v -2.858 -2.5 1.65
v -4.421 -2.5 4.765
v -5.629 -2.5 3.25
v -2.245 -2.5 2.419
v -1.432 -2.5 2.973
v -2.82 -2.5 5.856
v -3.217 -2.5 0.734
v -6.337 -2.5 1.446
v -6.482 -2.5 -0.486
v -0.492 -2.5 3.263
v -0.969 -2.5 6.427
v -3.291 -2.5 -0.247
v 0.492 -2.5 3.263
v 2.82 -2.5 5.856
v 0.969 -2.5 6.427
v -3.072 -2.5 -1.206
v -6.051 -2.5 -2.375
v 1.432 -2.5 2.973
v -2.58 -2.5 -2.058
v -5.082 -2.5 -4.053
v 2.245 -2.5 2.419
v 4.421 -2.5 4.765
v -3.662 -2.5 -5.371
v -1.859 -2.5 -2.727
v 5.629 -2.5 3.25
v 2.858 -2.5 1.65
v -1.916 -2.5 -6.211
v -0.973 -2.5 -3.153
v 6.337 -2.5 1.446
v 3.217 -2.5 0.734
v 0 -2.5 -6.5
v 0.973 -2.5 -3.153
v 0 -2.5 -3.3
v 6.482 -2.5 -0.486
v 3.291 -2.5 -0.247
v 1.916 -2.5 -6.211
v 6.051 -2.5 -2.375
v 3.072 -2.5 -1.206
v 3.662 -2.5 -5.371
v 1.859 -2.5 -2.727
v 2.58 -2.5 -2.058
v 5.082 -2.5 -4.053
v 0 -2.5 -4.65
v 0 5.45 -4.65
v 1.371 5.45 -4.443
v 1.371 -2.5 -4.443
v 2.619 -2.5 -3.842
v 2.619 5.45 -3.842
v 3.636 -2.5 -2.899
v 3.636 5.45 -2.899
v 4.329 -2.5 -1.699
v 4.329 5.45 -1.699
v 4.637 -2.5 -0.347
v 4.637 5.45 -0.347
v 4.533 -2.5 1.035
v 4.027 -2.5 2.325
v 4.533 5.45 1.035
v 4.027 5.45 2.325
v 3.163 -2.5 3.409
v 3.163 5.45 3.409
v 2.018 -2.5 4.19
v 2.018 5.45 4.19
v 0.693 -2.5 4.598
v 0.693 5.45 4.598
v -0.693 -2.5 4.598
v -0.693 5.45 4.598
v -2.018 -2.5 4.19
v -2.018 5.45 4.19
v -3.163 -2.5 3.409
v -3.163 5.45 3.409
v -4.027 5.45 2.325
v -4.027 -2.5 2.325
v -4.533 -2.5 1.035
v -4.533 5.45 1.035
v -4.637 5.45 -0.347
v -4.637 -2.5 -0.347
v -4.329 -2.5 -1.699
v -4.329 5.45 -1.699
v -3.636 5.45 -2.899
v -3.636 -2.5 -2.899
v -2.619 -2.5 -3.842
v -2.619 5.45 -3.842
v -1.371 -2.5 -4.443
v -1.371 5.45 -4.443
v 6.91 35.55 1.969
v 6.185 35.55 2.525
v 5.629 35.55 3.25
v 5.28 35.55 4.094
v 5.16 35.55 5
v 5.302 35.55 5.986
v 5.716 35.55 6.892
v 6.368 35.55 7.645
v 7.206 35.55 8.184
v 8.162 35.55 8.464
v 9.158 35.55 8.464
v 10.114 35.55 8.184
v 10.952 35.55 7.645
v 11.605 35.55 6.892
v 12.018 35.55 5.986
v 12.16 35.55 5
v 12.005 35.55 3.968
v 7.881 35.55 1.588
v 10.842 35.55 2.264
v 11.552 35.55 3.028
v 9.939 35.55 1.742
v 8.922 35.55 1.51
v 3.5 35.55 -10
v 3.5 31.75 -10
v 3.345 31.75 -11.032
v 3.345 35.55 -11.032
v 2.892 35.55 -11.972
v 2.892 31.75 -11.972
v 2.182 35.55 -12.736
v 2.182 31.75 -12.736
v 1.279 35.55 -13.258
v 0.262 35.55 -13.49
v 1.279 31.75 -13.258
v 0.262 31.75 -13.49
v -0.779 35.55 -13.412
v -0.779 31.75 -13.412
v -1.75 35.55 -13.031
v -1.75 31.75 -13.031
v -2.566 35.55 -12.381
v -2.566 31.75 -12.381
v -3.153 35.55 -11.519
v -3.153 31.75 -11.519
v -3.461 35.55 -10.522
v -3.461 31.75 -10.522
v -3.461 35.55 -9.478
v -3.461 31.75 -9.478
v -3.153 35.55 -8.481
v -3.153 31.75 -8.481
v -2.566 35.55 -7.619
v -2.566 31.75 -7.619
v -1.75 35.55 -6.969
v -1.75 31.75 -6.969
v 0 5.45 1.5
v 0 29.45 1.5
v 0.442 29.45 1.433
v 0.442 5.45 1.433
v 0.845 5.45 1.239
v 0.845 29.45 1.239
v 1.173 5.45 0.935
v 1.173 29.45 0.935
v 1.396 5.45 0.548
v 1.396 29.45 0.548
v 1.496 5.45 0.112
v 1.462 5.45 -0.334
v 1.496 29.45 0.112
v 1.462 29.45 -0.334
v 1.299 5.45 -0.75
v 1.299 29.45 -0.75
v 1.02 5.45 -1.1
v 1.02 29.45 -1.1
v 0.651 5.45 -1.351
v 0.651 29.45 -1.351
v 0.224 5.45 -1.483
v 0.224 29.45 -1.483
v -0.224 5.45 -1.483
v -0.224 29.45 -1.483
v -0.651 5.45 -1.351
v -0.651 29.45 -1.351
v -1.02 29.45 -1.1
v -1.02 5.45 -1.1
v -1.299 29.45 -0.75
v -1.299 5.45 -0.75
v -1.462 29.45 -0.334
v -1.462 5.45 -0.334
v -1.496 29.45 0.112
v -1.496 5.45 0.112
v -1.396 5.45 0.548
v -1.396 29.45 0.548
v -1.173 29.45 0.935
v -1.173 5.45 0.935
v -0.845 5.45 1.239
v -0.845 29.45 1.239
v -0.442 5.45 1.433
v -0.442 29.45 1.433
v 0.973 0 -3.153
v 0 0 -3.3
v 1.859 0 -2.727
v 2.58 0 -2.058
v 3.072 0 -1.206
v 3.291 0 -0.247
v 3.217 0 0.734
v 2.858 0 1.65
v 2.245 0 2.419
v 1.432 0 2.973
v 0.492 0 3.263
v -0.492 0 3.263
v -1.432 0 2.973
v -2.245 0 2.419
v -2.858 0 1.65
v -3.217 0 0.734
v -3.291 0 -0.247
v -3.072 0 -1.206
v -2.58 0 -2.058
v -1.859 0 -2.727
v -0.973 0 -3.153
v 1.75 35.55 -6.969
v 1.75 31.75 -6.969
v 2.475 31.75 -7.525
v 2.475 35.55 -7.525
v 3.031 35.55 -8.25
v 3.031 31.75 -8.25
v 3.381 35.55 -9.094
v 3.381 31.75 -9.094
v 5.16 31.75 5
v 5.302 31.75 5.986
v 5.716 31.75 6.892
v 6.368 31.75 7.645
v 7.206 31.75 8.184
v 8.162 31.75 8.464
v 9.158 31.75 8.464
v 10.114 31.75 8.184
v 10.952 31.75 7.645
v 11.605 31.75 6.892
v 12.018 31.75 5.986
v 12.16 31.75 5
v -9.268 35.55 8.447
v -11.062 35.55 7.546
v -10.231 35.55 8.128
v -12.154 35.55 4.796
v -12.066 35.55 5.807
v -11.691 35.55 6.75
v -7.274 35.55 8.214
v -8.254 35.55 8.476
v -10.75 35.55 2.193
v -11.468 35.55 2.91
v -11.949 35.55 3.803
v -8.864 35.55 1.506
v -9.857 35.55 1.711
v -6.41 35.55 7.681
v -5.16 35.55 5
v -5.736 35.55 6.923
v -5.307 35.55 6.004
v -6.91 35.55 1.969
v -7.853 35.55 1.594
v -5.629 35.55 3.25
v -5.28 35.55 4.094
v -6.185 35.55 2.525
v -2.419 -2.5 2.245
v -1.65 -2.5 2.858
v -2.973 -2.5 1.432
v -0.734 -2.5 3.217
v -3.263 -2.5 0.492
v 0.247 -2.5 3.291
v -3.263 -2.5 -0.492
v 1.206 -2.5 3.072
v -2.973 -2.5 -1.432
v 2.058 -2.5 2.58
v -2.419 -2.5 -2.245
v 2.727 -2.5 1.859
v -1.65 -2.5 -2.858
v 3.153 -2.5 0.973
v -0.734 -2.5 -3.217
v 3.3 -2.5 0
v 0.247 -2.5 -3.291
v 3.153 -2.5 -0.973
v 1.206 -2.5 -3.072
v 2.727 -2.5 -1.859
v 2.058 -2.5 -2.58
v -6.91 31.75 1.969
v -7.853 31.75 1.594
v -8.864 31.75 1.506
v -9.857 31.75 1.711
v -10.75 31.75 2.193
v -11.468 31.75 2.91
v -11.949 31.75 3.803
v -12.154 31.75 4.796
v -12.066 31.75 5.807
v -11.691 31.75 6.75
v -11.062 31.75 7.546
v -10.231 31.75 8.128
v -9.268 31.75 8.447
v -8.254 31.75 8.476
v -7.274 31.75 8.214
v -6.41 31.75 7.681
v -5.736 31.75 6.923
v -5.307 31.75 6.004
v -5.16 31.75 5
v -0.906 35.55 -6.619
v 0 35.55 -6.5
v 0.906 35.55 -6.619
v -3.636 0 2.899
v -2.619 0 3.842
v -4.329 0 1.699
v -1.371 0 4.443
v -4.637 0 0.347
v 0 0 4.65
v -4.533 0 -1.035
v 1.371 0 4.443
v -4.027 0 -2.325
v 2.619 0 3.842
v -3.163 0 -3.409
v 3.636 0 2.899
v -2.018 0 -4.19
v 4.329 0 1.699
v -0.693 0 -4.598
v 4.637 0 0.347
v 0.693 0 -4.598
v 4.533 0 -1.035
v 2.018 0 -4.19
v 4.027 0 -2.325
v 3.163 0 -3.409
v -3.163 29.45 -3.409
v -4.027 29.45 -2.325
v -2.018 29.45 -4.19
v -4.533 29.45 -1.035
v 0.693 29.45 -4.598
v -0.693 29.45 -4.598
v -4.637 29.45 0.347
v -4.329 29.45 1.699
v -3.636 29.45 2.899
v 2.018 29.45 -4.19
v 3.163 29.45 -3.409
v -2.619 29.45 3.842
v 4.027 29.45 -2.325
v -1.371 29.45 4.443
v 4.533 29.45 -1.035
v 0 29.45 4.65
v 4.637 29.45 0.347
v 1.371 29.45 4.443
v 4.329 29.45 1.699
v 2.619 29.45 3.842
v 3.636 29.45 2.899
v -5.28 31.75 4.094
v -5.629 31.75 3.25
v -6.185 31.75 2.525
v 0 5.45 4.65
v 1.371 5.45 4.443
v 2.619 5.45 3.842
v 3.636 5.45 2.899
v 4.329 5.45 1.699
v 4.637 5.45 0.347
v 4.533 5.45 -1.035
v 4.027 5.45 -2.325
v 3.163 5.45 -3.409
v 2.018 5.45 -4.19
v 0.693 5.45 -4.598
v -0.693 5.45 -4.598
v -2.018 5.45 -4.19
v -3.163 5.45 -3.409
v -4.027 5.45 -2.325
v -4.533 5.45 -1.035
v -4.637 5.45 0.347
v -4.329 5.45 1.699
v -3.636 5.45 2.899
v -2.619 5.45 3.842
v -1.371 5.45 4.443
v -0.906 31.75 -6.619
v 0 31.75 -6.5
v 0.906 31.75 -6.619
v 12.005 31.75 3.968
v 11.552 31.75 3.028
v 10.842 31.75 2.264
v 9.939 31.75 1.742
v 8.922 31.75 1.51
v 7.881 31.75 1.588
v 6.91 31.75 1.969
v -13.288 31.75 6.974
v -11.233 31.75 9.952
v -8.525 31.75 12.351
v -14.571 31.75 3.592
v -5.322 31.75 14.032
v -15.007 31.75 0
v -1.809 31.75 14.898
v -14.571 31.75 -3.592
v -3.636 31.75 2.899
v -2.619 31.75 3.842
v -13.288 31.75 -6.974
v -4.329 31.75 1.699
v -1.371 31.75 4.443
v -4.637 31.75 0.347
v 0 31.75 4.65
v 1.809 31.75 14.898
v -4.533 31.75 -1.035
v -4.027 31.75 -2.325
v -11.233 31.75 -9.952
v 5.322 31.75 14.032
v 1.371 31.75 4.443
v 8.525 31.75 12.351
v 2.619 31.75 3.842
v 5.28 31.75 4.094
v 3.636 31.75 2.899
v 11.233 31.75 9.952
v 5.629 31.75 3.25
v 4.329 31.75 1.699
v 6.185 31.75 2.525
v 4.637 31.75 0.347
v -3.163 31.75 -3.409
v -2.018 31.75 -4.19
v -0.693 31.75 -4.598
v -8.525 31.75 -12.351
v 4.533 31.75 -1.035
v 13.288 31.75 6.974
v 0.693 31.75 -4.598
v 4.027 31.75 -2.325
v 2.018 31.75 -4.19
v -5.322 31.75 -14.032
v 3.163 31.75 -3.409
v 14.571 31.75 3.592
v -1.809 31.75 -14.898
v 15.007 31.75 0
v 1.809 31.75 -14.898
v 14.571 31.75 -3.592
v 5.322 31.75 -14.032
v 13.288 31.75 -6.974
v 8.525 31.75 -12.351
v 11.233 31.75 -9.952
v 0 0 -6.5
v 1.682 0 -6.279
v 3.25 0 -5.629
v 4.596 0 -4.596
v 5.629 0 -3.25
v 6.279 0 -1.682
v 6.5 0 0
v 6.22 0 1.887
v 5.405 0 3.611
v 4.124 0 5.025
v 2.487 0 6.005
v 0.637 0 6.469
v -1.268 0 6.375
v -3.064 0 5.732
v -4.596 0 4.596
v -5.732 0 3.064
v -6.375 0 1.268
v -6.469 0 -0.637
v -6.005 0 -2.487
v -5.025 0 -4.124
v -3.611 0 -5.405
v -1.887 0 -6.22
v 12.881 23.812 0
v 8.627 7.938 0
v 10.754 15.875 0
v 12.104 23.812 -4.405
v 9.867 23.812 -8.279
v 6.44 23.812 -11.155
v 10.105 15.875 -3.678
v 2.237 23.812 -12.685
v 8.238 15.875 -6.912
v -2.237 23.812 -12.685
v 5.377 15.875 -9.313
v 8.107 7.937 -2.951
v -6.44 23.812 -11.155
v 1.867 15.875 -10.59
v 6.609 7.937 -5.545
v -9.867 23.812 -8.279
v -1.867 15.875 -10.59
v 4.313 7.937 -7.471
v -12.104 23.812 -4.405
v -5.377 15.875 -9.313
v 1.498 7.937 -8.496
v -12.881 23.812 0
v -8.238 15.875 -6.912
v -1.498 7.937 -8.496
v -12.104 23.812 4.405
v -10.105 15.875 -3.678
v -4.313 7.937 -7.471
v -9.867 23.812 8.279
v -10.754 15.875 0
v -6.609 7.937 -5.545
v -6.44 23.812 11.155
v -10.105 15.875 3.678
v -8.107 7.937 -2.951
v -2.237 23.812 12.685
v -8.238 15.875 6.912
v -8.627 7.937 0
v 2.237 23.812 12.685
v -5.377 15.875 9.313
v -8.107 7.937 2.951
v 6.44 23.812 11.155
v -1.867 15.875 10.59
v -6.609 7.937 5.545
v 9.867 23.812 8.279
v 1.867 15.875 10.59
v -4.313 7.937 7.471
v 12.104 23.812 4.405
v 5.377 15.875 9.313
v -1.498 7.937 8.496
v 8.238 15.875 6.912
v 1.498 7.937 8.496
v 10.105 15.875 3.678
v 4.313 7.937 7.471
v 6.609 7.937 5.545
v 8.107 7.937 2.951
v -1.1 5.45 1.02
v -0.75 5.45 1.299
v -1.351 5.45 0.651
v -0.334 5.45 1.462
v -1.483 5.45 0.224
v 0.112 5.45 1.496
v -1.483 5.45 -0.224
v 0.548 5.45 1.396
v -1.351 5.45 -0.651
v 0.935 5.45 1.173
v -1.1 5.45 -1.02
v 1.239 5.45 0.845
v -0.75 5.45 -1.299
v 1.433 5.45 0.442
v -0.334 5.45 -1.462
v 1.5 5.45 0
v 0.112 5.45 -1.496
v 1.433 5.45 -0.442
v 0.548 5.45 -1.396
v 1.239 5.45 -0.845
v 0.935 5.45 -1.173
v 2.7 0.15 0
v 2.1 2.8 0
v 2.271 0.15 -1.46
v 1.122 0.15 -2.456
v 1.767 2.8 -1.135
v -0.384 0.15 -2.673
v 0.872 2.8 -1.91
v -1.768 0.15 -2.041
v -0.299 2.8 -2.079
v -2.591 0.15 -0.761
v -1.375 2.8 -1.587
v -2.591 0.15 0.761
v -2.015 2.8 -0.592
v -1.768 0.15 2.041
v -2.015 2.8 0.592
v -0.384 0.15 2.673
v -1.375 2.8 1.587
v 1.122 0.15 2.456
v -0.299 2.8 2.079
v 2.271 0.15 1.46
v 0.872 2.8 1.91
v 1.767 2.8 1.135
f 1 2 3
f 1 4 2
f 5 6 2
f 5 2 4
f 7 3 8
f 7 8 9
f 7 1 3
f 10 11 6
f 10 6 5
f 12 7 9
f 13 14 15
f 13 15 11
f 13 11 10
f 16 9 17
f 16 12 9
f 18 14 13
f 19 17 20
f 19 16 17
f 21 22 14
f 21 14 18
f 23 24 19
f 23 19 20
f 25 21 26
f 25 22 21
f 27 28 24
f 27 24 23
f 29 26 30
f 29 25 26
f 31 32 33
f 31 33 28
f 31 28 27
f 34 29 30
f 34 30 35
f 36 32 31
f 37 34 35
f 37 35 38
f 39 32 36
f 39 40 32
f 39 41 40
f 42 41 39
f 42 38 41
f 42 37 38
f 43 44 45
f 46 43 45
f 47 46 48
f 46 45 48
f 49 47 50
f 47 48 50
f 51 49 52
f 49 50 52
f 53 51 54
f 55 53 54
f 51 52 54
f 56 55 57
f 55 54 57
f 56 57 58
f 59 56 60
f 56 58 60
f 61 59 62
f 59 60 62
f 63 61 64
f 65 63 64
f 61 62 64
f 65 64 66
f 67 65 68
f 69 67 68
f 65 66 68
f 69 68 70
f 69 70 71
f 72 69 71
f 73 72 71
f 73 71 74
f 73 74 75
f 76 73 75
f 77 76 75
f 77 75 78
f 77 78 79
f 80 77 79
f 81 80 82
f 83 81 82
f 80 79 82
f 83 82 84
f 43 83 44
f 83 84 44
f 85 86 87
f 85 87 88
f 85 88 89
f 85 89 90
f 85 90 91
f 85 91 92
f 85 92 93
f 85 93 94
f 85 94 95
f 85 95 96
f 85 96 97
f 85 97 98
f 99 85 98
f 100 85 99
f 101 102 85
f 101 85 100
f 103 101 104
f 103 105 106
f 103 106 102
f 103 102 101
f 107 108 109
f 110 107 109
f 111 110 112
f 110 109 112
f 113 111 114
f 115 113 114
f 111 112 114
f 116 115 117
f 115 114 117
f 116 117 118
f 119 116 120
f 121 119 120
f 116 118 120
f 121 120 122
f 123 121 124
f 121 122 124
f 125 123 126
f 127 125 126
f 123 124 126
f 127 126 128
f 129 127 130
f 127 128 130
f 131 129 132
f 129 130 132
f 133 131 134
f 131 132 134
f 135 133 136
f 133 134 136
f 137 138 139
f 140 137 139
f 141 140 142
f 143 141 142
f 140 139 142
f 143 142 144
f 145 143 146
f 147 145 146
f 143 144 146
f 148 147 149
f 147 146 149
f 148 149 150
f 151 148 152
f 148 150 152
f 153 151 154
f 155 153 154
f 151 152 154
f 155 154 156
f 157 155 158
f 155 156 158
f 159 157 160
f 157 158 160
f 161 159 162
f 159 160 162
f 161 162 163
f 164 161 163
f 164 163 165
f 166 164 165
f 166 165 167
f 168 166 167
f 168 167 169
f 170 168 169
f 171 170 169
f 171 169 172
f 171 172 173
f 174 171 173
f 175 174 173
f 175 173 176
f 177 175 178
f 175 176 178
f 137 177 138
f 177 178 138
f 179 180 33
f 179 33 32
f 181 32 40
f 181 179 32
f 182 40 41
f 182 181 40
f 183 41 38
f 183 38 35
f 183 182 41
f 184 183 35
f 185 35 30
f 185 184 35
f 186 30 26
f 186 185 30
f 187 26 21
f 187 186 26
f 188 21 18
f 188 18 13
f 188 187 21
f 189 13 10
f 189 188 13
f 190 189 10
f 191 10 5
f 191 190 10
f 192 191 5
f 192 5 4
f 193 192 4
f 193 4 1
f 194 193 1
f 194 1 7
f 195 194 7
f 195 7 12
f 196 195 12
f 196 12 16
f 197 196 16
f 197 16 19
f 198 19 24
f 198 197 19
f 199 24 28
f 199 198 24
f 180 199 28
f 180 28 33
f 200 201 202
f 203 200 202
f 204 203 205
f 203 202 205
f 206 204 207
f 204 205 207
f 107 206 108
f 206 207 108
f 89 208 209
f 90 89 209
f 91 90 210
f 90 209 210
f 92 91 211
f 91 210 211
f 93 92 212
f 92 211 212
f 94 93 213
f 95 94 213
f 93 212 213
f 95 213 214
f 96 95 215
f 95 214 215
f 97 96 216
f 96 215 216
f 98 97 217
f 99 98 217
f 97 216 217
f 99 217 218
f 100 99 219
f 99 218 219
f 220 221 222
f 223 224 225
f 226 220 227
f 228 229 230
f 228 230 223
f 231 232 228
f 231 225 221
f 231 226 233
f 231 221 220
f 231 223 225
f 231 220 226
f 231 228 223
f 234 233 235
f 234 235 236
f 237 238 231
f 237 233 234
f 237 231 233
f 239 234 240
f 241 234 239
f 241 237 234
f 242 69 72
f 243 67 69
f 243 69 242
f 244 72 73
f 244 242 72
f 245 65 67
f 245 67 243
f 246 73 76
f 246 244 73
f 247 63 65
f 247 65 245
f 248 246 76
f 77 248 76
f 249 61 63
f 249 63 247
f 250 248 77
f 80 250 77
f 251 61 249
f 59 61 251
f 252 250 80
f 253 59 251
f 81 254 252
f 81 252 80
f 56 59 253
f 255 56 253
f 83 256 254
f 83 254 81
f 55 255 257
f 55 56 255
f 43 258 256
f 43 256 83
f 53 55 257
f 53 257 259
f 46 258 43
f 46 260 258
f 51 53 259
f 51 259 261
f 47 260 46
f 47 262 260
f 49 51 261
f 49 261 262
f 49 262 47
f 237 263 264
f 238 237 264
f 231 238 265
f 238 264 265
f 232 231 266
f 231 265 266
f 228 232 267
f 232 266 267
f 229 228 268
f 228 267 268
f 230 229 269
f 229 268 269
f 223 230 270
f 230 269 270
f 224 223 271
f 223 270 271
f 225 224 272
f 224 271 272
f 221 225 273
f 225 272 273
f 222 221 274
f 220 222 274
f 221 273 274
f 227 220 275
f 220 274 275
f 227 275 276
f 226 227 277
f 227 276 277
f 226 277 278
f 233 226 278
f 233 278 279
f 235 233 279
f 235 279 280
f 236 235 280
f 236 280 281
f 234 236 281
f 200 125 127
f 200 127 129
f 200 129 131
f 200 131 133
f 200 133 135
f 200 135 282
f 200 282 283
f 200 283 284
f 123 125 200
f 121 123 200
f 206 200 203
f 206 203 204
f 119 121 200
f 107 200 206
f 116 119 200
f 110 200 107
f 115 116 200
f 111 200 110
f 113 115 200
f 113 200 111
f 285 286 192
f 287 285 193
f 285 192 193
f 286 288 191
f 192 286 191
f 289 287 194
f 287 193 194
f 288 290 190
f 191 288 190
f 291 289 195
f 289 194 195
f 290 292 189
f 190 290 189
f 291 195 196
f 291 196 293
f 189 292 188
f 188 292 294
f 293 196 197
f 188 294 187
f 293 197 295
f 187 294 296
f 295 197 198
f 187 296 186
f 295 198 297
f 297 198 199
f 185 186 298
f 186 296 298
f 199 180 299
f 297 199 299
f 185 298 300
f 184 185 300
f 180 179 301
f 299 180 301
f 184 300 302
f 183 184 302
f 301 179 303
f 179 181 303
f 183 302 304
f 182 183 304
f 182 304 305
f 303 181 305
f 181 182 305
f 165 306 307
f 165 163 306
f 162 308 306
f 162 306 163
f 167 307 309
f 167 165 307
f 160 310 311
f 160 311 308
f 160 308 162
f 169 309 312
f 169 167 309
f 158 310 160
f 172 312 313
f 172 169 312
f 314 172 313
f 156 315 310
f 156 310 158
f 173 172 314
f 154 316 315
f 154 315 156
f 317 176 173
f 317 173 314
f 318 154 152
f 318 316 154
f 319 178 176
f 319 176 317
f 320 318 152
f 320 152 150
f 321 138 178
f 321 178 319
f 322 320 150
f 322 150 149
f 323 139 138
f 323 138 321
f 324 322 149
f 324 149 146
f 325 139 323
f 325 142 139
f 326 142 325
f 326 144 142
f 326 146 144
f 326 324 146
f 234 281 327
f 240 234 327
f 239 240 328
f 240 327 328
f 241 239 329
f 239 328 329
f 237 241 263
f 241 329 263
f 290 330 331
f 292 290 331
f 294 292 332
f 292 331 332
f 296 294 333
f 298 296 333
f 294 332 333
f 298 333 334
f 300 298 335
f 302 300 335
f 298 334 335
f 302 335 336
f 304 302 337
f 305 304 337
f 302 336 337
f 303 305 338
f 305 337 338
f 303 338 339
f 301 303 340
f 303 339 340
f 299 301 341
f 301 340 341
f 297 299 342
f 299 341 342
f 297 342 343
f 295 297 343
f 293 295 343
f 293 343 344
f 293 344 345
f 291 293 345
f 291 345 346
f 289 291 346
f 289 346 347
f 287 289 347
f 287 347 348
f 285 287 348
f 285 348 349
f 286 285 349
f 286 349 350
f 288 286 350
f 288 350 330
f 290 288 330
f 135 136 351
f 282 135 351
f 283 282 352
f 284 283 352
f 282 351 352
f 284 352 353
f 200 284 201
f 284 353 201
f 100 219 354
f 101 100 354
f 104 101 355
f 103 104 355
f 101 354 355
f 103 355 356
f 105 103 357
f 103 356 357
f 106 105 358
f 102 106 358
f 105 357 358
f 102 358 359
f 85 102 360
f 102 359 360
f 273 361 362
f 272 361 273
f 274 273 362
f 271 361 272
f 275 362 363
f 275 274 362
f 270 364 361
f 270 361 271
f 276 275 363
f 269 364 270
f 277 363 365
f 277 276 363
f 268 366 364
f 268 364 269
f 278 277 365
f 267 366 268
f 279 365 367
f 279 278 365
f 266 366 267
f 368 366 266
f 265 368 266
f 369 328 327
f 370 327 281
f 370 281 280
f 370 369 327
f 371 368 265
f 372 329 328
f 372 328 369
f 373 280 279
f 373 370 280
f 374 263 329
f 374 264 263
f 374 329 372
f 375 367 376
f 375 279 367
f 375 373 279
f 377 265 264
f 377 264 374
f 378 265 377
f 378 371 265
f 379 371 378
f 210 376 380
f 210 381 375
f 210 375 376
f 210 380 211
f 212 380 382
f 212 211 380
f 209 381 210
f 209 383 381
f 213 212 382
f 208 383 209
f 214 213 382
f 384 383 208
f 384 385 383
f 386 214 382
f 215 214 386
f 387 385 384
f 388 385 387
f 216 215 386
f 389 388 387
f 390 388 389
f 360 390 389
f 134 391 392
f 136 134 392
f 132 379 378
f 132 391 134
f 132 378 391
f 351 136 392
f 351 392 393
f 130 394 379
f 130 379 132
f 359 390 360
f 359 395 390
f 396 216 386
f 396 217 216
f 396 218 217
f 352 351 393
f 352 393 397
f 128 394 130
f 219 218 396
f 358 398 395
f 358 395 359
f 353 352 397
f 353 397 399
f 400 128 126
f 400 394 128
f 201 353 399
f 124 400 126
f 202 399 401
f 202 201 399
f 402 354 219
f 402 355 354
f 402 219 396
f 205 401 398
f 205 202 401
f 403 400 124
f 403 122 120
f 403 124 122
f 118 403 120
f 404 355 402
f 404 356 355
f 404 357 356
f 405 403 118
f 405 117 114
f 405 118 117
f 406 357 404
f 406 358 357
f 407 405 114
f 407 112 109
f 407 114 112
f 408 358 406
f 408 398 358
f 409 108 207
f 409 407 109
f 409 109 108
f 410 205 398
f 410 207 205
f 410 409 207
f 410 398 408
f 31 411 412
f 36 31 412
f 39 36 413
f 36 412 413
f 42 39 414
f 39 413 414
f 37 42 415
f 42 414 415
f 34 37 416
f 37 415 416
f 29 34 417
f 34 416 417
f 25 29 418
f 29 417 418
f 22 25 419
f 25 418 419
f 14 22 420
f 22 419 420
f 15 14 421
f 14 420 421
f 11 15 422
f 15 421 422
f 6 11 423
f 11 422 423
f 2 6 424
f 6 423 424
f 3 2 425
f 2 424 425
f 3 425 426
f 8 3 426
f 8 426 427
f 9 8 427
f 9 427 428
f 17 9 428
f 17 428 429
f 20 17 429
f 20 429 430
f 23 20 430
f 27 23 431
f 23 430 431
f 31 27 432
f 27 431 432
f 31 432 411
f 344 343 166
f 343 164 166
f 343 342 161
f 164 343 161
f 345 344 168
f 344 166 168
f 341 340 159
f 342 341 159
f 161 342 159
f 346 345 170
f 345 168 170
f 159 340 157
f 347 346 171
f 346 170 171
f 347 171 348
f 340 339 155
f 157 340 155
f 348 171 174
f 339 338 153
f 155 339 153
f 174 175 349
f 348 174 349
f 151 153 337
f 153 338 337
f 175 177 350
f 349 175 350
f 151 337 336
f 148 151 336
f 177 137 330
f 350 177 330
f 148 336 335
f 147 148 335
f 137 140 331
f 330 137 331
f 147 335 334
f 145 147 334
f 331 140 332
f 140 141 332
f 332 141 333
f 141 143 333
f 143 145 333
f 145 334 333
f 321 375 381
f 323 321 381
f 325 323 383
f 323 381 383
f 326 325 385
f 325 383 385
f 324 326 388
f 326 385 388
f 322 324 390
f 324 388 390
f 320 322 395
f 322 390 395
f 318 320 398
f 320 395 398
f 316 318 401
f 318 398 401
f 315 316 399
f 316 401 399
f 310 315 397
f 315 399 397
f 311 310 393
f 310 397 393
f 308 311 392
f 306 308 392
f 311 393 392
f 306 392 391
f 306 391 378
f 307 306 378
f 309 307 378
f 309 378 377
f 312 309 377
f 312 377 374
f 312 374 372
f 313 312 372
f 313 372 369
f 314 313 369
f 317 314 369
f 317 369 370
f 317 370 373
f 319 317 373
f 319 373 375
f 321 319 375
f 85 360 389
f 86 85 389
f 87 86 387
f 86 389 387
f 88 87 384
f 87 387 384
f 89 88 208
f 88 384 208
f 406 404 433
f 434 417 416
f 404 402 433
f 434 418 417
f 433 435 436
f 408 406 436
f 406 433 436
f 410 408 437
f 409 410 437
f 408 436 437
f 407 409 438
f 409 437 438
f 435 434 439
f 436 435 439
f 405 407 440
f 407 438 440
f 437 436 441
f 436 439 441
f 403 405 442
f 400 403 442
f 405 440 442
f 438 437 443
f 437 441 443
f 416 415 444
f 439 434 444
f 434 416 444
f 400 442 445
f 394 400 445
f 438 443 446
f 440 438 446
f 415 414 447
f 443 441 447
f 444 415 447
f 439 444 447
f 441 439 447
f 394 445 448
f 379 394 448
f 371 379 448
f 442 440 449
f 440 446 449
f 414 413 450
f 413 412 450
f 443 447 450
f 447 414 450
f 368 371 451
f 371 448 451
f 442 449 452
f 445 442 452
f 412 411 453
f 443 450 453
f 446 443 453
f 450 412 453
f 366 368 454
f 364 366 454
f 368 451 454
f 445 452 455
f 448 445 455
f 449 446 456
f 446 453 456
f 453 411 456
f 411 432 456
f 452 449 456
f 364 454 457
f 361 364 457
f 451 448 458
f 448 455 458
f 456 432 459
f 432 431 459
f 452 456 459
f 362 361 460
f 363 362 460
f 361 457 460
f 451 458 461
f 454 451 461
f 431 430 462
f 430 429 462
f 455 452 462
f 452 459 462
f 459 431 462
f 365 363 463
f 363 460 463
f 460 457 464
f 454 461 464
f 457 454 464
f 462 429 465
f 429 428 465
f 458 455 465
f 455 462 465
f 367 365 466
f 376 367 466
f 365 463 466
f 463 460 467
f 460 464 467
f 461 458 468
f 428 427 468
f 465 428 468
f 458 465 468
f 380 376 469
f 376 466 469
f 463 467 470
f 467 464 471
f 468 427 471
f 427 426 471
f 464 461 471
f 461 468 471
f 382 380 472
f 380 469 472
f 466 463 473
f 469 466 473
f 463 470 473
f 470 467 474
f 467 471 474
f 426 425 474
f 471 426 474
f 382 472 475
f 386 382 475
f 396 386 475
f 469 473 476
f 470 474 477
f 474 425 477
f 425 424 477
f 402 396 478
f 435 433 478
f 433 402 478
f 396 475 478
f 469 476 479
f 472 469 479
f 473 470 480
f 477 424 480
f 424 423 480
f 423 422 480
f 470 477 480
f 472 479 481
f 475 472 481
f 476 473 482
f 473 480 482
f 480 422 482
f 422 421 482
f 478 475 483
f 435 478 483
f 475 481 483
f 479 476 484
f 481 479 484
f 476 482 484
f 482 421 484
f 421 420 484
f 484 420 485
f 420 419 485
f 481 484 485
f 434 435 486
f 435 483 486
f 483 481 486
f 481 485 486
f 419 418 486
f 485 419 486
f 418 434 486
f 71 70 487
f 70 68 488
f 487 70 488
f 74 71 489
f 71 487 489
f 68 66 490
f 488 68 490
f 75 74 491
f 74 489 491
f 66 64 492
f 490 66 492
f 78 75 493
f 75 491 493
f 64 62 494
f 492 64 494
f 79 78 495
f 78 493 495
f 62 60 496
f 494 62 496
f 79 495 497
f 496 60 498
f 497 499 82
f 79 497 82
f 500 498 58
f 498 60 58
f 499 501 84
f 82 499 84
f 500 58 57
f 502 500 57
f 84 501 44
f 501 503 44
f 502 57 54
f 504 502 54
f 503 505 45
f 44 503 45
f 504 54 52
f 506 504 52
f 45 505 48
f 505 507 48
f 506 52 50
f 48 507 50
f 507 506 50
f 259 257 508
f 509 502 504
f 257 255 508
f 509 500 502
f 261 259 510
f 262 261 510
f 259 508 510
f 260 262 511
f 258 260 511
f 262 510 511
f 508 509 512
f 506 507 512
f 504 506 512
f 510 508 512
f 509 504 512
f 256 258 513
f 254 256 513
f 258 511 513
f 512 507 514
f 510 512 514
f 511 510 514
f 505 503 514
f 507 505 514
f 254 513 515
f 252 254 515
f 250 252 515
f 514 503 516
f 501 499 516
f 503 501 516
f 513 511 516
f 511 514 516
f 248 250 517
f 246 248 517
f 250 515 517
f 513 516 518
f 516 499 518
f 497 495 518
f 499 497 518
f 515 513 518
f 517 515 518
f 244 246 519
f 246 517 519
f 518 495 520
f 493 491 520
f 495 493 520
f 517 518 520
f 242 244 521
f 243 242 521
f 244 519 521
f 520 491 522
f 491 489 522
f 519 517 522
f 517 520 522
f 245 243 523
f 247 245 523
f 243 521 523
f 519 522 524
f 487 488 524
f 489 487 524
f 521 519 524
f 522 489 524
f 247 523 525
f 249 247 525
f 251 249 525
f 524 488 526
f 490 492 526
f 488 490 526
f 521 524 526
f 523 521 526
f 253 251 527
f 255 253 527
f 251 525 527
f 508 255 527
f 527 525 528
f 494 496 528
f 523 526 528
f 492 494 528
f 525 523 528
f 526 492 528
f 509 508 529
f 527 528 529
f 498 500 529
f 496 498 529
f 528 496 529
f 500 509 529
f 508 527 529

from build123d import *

# Parameters (mm, degrees)
SKETCH1_R            = 6.500000081
ANGLEBODY_DEPTH      = 31.75
ANGLEBODY_DRAFT      = -15
SKETCH2_R            = 4.649999971
SKETCH2_R_2          = 1.93499994
CENTERHOLE_DEPTH     = 39.190389178
F_40TPEGS_DEPTH      = 3.80000002
SKETCH3_R            = 6.500000081
SKETCH3_R_2          = 3.300000004
F_20TINTERFACE_DEPTH = 2.50000008
BOSS_EXTRUDE1_START  = -2.299999972
SKETCH4_R            = 4.649999971
SKETCH4_R_2          = 1.5
BOSS_EXTRUDE1_DEPTH  = 24
SKETCH5_R            = 4.649999971
SKETCH5_R_2          = 1.5
BOSS_EXTRUDE2_DEPTH  = 7.950000108


# Read off the part's stored shape, not the designer's step: Cut-Loft1
with BuildPart() as part:
    # Sketch1 → AngleBody (with draft: the straight prism first)
    with BuildSketch(Plane(origin=(0, 0, 0), x_dir=(1, 0, 0), z_dir=(0, 1, 0))):
        Circle(SKETCH1_R)
    extrude(amount=ANGLEBODY_DEPTH)
    # AngleBody: the draft: its side faces are tilted about the plane it starts from
    anglebody_sides = [part.faces().sort_by_distance(p)[0] for p in [
        (-6.500000081, 15.875, 0),
    ]]
    draft(anglebody_sides, Plane(origin=(0, 0, 0), x_dir=(1, 0, 0), z_dir=(0, 1, 0)), ANGLEBODY_DRAFT)

    # Sketch2 → CenterHole (cut, through all)
    # profile 1 of 2: a face of its own
    with BuildSketch(Plane(origin=(0, 31.75, 0), x_dir=(1, 0, 0), z_dir=(0, 1, 0))):
        with Locations(Location((0, 0, 0), (0, 0, 270))):
            Circle(SKETCH2_R)
        Circle(SKETCH2_R_2, mode=Mode.SUBTRACT)
    # profile 2 of 2: a face of its own
    with BuildSketch(Plane(origin=(0, 31.75, 0), x_dir=(1, 0, 0), z_dir=(0, 1, 0))):
        Circle(SKETCH2_R_2)
    extrude(amount=-CENTERHOLE_DEPTH, mode=Mode.SUBTRACT)

    # Sketch2<3> → 40tPegs (add)
    with BuildSketch(Plane(origin=(0, 31.75, 0), x_dir=(1, 0, 0), z_dir=(0, 1, 0))):
        with BuildLine():
            ThreePointArc((3.499999985, 10.000000066), (-1.749999993, 13.031088966), (-1.749999992, 6.968911166))
            Line((-1.749999992, 6.968911166), (0, 10.000000066))
            Line((0, 10.000000066), (1.749999992, 6.968911166))
            ThreePointArc((1.749999992, 6.968911166), (3.0310889, 8.250000073), (3.499999985, 10.000000066))
        make_face()
        with BuildLine():
            Line((0, 10.000000066), (-1.749999992, 6.968911166))
            ThreePointArc((-1.749999992, 6.968911166), (0, 6.500000081), (1.749999992, 6.968911166))
            Line((1.749999992, 6.968911166), (0, 10.000000066))
        make_face()
        with BuildLine():
            Line((-6.910254103, -1.968911133), (-8.660254095, -5.000000033))
            Line((-8.660254095, -5.000000033), (-5.16025411, -5.000000033))
            ThreePointArc((-5.16025411, -5.000000033), (-5.629165195, -3.25000004), (-6.910254103, -1.968911133))
        make_face()
        with BuildLine():
            Line((-5.16025411, -5.000000033), (-8.660254095, -5.000000033))
            Line((-8.660254095, -5.000000033), (-6.910254103, -1.968911133))
            ThreePointArc((-6.910254103, -1.968911133), (-11.691342995, -6.750000026), (-5.16025411, -5.000000033))
        make_face()
        with BuildLine():
            ThreePointArc((6.910254103, -1.968911133), (5.629165195, -3.25000004), (5.16025411, -5.000000033))
            Line((5.16025411, -5.000000033), (8.660254095, -5.000000033))
            Line((8.660254095, -5.000000033), (6.910254103, -1.968911133))
        make_face()
        with BuildLine():
            Line((8.660254095, -5.000000033), (5.16025411, -5.000000033))
            ThreePointArc((5.16025411, -5.000000033), (8.660254095, -8.500000018), (12.16025408, -5.000000033))
            ThreePointArc((12.16025408, -5.000000033), (10.410254088, -1.968911133), (6.910254103, -1.968911133))
            Line((6.910254103, -1.968911133), (8.660254095, -5.000000033))
        make_face()
    extrude(amount=F_40TPEGS_DEPTH)

    # Sketch3 → 20tInterface (add)
    with BuildSketch(Plane.XZ):
        with Locations(Location((0, 0, 0), (0, 0, 270))):
            Circle(SKETCH3_R)
        with Locations(Location((0, 0, 0), (0, 0, 270))):
            Circle(SKETCH3_R_2, mode=Mode.SUBTRACT)
    extrude(amount=F_20TINTERFACE_DEPTH)

    # Sketch4 → Boss-Extrude1 (add)
    with BuildSketch(Plane(origin=(0, 31.75, 0), x_dir=(1, 0, 0), z_dir=(0, 1, 0)).offset(BOSS_EXTRUDE1_START)):
        with Locations(Location((0, 0, 0), (0, 0, 270))):
            Circle(SKETCH4_R)
        with Locations(Location((0, 0, 0), (0, 0, 270))):
            Circle(SKETCH4_R_2, mode=Mode.SUBTRACT)
    extrude(amount=-BOSS_EXTRUDE1_DEPTH)


with BuildPart() as body_2:
    # Sketch5 → Boss-Extrude2 (new body)
    with BuildSketch(Plane.XZ.offset(-5.450000028)):
        with Locations(Location((0, 0, 0), (0, 0, 270))):
            Circle(SKETCH5_R)
        with Locations(Location((0, 0, 0), (0, 0, 270))):
            Circle(SKETCH5_R_2, mode=Mode.SUBTRACT)
    extrude(amount=BOSS_EXTRUDE2_DEPTH)

    # Cut-Loft1 outline → Cut-Loft1 (revolve, cut)
    with BuildSketch(Plane.XY):
        Polygon((3.300000004, -2.50000008), (1.5, 5.450000028), (1.5, -2.50000008), align=None)
    revolve(axis=Axis((0, 0, 0), (0, 1, 0)), mode=Mode.SUBTRACT)


solid = Compound([part.part, body_2.part])
